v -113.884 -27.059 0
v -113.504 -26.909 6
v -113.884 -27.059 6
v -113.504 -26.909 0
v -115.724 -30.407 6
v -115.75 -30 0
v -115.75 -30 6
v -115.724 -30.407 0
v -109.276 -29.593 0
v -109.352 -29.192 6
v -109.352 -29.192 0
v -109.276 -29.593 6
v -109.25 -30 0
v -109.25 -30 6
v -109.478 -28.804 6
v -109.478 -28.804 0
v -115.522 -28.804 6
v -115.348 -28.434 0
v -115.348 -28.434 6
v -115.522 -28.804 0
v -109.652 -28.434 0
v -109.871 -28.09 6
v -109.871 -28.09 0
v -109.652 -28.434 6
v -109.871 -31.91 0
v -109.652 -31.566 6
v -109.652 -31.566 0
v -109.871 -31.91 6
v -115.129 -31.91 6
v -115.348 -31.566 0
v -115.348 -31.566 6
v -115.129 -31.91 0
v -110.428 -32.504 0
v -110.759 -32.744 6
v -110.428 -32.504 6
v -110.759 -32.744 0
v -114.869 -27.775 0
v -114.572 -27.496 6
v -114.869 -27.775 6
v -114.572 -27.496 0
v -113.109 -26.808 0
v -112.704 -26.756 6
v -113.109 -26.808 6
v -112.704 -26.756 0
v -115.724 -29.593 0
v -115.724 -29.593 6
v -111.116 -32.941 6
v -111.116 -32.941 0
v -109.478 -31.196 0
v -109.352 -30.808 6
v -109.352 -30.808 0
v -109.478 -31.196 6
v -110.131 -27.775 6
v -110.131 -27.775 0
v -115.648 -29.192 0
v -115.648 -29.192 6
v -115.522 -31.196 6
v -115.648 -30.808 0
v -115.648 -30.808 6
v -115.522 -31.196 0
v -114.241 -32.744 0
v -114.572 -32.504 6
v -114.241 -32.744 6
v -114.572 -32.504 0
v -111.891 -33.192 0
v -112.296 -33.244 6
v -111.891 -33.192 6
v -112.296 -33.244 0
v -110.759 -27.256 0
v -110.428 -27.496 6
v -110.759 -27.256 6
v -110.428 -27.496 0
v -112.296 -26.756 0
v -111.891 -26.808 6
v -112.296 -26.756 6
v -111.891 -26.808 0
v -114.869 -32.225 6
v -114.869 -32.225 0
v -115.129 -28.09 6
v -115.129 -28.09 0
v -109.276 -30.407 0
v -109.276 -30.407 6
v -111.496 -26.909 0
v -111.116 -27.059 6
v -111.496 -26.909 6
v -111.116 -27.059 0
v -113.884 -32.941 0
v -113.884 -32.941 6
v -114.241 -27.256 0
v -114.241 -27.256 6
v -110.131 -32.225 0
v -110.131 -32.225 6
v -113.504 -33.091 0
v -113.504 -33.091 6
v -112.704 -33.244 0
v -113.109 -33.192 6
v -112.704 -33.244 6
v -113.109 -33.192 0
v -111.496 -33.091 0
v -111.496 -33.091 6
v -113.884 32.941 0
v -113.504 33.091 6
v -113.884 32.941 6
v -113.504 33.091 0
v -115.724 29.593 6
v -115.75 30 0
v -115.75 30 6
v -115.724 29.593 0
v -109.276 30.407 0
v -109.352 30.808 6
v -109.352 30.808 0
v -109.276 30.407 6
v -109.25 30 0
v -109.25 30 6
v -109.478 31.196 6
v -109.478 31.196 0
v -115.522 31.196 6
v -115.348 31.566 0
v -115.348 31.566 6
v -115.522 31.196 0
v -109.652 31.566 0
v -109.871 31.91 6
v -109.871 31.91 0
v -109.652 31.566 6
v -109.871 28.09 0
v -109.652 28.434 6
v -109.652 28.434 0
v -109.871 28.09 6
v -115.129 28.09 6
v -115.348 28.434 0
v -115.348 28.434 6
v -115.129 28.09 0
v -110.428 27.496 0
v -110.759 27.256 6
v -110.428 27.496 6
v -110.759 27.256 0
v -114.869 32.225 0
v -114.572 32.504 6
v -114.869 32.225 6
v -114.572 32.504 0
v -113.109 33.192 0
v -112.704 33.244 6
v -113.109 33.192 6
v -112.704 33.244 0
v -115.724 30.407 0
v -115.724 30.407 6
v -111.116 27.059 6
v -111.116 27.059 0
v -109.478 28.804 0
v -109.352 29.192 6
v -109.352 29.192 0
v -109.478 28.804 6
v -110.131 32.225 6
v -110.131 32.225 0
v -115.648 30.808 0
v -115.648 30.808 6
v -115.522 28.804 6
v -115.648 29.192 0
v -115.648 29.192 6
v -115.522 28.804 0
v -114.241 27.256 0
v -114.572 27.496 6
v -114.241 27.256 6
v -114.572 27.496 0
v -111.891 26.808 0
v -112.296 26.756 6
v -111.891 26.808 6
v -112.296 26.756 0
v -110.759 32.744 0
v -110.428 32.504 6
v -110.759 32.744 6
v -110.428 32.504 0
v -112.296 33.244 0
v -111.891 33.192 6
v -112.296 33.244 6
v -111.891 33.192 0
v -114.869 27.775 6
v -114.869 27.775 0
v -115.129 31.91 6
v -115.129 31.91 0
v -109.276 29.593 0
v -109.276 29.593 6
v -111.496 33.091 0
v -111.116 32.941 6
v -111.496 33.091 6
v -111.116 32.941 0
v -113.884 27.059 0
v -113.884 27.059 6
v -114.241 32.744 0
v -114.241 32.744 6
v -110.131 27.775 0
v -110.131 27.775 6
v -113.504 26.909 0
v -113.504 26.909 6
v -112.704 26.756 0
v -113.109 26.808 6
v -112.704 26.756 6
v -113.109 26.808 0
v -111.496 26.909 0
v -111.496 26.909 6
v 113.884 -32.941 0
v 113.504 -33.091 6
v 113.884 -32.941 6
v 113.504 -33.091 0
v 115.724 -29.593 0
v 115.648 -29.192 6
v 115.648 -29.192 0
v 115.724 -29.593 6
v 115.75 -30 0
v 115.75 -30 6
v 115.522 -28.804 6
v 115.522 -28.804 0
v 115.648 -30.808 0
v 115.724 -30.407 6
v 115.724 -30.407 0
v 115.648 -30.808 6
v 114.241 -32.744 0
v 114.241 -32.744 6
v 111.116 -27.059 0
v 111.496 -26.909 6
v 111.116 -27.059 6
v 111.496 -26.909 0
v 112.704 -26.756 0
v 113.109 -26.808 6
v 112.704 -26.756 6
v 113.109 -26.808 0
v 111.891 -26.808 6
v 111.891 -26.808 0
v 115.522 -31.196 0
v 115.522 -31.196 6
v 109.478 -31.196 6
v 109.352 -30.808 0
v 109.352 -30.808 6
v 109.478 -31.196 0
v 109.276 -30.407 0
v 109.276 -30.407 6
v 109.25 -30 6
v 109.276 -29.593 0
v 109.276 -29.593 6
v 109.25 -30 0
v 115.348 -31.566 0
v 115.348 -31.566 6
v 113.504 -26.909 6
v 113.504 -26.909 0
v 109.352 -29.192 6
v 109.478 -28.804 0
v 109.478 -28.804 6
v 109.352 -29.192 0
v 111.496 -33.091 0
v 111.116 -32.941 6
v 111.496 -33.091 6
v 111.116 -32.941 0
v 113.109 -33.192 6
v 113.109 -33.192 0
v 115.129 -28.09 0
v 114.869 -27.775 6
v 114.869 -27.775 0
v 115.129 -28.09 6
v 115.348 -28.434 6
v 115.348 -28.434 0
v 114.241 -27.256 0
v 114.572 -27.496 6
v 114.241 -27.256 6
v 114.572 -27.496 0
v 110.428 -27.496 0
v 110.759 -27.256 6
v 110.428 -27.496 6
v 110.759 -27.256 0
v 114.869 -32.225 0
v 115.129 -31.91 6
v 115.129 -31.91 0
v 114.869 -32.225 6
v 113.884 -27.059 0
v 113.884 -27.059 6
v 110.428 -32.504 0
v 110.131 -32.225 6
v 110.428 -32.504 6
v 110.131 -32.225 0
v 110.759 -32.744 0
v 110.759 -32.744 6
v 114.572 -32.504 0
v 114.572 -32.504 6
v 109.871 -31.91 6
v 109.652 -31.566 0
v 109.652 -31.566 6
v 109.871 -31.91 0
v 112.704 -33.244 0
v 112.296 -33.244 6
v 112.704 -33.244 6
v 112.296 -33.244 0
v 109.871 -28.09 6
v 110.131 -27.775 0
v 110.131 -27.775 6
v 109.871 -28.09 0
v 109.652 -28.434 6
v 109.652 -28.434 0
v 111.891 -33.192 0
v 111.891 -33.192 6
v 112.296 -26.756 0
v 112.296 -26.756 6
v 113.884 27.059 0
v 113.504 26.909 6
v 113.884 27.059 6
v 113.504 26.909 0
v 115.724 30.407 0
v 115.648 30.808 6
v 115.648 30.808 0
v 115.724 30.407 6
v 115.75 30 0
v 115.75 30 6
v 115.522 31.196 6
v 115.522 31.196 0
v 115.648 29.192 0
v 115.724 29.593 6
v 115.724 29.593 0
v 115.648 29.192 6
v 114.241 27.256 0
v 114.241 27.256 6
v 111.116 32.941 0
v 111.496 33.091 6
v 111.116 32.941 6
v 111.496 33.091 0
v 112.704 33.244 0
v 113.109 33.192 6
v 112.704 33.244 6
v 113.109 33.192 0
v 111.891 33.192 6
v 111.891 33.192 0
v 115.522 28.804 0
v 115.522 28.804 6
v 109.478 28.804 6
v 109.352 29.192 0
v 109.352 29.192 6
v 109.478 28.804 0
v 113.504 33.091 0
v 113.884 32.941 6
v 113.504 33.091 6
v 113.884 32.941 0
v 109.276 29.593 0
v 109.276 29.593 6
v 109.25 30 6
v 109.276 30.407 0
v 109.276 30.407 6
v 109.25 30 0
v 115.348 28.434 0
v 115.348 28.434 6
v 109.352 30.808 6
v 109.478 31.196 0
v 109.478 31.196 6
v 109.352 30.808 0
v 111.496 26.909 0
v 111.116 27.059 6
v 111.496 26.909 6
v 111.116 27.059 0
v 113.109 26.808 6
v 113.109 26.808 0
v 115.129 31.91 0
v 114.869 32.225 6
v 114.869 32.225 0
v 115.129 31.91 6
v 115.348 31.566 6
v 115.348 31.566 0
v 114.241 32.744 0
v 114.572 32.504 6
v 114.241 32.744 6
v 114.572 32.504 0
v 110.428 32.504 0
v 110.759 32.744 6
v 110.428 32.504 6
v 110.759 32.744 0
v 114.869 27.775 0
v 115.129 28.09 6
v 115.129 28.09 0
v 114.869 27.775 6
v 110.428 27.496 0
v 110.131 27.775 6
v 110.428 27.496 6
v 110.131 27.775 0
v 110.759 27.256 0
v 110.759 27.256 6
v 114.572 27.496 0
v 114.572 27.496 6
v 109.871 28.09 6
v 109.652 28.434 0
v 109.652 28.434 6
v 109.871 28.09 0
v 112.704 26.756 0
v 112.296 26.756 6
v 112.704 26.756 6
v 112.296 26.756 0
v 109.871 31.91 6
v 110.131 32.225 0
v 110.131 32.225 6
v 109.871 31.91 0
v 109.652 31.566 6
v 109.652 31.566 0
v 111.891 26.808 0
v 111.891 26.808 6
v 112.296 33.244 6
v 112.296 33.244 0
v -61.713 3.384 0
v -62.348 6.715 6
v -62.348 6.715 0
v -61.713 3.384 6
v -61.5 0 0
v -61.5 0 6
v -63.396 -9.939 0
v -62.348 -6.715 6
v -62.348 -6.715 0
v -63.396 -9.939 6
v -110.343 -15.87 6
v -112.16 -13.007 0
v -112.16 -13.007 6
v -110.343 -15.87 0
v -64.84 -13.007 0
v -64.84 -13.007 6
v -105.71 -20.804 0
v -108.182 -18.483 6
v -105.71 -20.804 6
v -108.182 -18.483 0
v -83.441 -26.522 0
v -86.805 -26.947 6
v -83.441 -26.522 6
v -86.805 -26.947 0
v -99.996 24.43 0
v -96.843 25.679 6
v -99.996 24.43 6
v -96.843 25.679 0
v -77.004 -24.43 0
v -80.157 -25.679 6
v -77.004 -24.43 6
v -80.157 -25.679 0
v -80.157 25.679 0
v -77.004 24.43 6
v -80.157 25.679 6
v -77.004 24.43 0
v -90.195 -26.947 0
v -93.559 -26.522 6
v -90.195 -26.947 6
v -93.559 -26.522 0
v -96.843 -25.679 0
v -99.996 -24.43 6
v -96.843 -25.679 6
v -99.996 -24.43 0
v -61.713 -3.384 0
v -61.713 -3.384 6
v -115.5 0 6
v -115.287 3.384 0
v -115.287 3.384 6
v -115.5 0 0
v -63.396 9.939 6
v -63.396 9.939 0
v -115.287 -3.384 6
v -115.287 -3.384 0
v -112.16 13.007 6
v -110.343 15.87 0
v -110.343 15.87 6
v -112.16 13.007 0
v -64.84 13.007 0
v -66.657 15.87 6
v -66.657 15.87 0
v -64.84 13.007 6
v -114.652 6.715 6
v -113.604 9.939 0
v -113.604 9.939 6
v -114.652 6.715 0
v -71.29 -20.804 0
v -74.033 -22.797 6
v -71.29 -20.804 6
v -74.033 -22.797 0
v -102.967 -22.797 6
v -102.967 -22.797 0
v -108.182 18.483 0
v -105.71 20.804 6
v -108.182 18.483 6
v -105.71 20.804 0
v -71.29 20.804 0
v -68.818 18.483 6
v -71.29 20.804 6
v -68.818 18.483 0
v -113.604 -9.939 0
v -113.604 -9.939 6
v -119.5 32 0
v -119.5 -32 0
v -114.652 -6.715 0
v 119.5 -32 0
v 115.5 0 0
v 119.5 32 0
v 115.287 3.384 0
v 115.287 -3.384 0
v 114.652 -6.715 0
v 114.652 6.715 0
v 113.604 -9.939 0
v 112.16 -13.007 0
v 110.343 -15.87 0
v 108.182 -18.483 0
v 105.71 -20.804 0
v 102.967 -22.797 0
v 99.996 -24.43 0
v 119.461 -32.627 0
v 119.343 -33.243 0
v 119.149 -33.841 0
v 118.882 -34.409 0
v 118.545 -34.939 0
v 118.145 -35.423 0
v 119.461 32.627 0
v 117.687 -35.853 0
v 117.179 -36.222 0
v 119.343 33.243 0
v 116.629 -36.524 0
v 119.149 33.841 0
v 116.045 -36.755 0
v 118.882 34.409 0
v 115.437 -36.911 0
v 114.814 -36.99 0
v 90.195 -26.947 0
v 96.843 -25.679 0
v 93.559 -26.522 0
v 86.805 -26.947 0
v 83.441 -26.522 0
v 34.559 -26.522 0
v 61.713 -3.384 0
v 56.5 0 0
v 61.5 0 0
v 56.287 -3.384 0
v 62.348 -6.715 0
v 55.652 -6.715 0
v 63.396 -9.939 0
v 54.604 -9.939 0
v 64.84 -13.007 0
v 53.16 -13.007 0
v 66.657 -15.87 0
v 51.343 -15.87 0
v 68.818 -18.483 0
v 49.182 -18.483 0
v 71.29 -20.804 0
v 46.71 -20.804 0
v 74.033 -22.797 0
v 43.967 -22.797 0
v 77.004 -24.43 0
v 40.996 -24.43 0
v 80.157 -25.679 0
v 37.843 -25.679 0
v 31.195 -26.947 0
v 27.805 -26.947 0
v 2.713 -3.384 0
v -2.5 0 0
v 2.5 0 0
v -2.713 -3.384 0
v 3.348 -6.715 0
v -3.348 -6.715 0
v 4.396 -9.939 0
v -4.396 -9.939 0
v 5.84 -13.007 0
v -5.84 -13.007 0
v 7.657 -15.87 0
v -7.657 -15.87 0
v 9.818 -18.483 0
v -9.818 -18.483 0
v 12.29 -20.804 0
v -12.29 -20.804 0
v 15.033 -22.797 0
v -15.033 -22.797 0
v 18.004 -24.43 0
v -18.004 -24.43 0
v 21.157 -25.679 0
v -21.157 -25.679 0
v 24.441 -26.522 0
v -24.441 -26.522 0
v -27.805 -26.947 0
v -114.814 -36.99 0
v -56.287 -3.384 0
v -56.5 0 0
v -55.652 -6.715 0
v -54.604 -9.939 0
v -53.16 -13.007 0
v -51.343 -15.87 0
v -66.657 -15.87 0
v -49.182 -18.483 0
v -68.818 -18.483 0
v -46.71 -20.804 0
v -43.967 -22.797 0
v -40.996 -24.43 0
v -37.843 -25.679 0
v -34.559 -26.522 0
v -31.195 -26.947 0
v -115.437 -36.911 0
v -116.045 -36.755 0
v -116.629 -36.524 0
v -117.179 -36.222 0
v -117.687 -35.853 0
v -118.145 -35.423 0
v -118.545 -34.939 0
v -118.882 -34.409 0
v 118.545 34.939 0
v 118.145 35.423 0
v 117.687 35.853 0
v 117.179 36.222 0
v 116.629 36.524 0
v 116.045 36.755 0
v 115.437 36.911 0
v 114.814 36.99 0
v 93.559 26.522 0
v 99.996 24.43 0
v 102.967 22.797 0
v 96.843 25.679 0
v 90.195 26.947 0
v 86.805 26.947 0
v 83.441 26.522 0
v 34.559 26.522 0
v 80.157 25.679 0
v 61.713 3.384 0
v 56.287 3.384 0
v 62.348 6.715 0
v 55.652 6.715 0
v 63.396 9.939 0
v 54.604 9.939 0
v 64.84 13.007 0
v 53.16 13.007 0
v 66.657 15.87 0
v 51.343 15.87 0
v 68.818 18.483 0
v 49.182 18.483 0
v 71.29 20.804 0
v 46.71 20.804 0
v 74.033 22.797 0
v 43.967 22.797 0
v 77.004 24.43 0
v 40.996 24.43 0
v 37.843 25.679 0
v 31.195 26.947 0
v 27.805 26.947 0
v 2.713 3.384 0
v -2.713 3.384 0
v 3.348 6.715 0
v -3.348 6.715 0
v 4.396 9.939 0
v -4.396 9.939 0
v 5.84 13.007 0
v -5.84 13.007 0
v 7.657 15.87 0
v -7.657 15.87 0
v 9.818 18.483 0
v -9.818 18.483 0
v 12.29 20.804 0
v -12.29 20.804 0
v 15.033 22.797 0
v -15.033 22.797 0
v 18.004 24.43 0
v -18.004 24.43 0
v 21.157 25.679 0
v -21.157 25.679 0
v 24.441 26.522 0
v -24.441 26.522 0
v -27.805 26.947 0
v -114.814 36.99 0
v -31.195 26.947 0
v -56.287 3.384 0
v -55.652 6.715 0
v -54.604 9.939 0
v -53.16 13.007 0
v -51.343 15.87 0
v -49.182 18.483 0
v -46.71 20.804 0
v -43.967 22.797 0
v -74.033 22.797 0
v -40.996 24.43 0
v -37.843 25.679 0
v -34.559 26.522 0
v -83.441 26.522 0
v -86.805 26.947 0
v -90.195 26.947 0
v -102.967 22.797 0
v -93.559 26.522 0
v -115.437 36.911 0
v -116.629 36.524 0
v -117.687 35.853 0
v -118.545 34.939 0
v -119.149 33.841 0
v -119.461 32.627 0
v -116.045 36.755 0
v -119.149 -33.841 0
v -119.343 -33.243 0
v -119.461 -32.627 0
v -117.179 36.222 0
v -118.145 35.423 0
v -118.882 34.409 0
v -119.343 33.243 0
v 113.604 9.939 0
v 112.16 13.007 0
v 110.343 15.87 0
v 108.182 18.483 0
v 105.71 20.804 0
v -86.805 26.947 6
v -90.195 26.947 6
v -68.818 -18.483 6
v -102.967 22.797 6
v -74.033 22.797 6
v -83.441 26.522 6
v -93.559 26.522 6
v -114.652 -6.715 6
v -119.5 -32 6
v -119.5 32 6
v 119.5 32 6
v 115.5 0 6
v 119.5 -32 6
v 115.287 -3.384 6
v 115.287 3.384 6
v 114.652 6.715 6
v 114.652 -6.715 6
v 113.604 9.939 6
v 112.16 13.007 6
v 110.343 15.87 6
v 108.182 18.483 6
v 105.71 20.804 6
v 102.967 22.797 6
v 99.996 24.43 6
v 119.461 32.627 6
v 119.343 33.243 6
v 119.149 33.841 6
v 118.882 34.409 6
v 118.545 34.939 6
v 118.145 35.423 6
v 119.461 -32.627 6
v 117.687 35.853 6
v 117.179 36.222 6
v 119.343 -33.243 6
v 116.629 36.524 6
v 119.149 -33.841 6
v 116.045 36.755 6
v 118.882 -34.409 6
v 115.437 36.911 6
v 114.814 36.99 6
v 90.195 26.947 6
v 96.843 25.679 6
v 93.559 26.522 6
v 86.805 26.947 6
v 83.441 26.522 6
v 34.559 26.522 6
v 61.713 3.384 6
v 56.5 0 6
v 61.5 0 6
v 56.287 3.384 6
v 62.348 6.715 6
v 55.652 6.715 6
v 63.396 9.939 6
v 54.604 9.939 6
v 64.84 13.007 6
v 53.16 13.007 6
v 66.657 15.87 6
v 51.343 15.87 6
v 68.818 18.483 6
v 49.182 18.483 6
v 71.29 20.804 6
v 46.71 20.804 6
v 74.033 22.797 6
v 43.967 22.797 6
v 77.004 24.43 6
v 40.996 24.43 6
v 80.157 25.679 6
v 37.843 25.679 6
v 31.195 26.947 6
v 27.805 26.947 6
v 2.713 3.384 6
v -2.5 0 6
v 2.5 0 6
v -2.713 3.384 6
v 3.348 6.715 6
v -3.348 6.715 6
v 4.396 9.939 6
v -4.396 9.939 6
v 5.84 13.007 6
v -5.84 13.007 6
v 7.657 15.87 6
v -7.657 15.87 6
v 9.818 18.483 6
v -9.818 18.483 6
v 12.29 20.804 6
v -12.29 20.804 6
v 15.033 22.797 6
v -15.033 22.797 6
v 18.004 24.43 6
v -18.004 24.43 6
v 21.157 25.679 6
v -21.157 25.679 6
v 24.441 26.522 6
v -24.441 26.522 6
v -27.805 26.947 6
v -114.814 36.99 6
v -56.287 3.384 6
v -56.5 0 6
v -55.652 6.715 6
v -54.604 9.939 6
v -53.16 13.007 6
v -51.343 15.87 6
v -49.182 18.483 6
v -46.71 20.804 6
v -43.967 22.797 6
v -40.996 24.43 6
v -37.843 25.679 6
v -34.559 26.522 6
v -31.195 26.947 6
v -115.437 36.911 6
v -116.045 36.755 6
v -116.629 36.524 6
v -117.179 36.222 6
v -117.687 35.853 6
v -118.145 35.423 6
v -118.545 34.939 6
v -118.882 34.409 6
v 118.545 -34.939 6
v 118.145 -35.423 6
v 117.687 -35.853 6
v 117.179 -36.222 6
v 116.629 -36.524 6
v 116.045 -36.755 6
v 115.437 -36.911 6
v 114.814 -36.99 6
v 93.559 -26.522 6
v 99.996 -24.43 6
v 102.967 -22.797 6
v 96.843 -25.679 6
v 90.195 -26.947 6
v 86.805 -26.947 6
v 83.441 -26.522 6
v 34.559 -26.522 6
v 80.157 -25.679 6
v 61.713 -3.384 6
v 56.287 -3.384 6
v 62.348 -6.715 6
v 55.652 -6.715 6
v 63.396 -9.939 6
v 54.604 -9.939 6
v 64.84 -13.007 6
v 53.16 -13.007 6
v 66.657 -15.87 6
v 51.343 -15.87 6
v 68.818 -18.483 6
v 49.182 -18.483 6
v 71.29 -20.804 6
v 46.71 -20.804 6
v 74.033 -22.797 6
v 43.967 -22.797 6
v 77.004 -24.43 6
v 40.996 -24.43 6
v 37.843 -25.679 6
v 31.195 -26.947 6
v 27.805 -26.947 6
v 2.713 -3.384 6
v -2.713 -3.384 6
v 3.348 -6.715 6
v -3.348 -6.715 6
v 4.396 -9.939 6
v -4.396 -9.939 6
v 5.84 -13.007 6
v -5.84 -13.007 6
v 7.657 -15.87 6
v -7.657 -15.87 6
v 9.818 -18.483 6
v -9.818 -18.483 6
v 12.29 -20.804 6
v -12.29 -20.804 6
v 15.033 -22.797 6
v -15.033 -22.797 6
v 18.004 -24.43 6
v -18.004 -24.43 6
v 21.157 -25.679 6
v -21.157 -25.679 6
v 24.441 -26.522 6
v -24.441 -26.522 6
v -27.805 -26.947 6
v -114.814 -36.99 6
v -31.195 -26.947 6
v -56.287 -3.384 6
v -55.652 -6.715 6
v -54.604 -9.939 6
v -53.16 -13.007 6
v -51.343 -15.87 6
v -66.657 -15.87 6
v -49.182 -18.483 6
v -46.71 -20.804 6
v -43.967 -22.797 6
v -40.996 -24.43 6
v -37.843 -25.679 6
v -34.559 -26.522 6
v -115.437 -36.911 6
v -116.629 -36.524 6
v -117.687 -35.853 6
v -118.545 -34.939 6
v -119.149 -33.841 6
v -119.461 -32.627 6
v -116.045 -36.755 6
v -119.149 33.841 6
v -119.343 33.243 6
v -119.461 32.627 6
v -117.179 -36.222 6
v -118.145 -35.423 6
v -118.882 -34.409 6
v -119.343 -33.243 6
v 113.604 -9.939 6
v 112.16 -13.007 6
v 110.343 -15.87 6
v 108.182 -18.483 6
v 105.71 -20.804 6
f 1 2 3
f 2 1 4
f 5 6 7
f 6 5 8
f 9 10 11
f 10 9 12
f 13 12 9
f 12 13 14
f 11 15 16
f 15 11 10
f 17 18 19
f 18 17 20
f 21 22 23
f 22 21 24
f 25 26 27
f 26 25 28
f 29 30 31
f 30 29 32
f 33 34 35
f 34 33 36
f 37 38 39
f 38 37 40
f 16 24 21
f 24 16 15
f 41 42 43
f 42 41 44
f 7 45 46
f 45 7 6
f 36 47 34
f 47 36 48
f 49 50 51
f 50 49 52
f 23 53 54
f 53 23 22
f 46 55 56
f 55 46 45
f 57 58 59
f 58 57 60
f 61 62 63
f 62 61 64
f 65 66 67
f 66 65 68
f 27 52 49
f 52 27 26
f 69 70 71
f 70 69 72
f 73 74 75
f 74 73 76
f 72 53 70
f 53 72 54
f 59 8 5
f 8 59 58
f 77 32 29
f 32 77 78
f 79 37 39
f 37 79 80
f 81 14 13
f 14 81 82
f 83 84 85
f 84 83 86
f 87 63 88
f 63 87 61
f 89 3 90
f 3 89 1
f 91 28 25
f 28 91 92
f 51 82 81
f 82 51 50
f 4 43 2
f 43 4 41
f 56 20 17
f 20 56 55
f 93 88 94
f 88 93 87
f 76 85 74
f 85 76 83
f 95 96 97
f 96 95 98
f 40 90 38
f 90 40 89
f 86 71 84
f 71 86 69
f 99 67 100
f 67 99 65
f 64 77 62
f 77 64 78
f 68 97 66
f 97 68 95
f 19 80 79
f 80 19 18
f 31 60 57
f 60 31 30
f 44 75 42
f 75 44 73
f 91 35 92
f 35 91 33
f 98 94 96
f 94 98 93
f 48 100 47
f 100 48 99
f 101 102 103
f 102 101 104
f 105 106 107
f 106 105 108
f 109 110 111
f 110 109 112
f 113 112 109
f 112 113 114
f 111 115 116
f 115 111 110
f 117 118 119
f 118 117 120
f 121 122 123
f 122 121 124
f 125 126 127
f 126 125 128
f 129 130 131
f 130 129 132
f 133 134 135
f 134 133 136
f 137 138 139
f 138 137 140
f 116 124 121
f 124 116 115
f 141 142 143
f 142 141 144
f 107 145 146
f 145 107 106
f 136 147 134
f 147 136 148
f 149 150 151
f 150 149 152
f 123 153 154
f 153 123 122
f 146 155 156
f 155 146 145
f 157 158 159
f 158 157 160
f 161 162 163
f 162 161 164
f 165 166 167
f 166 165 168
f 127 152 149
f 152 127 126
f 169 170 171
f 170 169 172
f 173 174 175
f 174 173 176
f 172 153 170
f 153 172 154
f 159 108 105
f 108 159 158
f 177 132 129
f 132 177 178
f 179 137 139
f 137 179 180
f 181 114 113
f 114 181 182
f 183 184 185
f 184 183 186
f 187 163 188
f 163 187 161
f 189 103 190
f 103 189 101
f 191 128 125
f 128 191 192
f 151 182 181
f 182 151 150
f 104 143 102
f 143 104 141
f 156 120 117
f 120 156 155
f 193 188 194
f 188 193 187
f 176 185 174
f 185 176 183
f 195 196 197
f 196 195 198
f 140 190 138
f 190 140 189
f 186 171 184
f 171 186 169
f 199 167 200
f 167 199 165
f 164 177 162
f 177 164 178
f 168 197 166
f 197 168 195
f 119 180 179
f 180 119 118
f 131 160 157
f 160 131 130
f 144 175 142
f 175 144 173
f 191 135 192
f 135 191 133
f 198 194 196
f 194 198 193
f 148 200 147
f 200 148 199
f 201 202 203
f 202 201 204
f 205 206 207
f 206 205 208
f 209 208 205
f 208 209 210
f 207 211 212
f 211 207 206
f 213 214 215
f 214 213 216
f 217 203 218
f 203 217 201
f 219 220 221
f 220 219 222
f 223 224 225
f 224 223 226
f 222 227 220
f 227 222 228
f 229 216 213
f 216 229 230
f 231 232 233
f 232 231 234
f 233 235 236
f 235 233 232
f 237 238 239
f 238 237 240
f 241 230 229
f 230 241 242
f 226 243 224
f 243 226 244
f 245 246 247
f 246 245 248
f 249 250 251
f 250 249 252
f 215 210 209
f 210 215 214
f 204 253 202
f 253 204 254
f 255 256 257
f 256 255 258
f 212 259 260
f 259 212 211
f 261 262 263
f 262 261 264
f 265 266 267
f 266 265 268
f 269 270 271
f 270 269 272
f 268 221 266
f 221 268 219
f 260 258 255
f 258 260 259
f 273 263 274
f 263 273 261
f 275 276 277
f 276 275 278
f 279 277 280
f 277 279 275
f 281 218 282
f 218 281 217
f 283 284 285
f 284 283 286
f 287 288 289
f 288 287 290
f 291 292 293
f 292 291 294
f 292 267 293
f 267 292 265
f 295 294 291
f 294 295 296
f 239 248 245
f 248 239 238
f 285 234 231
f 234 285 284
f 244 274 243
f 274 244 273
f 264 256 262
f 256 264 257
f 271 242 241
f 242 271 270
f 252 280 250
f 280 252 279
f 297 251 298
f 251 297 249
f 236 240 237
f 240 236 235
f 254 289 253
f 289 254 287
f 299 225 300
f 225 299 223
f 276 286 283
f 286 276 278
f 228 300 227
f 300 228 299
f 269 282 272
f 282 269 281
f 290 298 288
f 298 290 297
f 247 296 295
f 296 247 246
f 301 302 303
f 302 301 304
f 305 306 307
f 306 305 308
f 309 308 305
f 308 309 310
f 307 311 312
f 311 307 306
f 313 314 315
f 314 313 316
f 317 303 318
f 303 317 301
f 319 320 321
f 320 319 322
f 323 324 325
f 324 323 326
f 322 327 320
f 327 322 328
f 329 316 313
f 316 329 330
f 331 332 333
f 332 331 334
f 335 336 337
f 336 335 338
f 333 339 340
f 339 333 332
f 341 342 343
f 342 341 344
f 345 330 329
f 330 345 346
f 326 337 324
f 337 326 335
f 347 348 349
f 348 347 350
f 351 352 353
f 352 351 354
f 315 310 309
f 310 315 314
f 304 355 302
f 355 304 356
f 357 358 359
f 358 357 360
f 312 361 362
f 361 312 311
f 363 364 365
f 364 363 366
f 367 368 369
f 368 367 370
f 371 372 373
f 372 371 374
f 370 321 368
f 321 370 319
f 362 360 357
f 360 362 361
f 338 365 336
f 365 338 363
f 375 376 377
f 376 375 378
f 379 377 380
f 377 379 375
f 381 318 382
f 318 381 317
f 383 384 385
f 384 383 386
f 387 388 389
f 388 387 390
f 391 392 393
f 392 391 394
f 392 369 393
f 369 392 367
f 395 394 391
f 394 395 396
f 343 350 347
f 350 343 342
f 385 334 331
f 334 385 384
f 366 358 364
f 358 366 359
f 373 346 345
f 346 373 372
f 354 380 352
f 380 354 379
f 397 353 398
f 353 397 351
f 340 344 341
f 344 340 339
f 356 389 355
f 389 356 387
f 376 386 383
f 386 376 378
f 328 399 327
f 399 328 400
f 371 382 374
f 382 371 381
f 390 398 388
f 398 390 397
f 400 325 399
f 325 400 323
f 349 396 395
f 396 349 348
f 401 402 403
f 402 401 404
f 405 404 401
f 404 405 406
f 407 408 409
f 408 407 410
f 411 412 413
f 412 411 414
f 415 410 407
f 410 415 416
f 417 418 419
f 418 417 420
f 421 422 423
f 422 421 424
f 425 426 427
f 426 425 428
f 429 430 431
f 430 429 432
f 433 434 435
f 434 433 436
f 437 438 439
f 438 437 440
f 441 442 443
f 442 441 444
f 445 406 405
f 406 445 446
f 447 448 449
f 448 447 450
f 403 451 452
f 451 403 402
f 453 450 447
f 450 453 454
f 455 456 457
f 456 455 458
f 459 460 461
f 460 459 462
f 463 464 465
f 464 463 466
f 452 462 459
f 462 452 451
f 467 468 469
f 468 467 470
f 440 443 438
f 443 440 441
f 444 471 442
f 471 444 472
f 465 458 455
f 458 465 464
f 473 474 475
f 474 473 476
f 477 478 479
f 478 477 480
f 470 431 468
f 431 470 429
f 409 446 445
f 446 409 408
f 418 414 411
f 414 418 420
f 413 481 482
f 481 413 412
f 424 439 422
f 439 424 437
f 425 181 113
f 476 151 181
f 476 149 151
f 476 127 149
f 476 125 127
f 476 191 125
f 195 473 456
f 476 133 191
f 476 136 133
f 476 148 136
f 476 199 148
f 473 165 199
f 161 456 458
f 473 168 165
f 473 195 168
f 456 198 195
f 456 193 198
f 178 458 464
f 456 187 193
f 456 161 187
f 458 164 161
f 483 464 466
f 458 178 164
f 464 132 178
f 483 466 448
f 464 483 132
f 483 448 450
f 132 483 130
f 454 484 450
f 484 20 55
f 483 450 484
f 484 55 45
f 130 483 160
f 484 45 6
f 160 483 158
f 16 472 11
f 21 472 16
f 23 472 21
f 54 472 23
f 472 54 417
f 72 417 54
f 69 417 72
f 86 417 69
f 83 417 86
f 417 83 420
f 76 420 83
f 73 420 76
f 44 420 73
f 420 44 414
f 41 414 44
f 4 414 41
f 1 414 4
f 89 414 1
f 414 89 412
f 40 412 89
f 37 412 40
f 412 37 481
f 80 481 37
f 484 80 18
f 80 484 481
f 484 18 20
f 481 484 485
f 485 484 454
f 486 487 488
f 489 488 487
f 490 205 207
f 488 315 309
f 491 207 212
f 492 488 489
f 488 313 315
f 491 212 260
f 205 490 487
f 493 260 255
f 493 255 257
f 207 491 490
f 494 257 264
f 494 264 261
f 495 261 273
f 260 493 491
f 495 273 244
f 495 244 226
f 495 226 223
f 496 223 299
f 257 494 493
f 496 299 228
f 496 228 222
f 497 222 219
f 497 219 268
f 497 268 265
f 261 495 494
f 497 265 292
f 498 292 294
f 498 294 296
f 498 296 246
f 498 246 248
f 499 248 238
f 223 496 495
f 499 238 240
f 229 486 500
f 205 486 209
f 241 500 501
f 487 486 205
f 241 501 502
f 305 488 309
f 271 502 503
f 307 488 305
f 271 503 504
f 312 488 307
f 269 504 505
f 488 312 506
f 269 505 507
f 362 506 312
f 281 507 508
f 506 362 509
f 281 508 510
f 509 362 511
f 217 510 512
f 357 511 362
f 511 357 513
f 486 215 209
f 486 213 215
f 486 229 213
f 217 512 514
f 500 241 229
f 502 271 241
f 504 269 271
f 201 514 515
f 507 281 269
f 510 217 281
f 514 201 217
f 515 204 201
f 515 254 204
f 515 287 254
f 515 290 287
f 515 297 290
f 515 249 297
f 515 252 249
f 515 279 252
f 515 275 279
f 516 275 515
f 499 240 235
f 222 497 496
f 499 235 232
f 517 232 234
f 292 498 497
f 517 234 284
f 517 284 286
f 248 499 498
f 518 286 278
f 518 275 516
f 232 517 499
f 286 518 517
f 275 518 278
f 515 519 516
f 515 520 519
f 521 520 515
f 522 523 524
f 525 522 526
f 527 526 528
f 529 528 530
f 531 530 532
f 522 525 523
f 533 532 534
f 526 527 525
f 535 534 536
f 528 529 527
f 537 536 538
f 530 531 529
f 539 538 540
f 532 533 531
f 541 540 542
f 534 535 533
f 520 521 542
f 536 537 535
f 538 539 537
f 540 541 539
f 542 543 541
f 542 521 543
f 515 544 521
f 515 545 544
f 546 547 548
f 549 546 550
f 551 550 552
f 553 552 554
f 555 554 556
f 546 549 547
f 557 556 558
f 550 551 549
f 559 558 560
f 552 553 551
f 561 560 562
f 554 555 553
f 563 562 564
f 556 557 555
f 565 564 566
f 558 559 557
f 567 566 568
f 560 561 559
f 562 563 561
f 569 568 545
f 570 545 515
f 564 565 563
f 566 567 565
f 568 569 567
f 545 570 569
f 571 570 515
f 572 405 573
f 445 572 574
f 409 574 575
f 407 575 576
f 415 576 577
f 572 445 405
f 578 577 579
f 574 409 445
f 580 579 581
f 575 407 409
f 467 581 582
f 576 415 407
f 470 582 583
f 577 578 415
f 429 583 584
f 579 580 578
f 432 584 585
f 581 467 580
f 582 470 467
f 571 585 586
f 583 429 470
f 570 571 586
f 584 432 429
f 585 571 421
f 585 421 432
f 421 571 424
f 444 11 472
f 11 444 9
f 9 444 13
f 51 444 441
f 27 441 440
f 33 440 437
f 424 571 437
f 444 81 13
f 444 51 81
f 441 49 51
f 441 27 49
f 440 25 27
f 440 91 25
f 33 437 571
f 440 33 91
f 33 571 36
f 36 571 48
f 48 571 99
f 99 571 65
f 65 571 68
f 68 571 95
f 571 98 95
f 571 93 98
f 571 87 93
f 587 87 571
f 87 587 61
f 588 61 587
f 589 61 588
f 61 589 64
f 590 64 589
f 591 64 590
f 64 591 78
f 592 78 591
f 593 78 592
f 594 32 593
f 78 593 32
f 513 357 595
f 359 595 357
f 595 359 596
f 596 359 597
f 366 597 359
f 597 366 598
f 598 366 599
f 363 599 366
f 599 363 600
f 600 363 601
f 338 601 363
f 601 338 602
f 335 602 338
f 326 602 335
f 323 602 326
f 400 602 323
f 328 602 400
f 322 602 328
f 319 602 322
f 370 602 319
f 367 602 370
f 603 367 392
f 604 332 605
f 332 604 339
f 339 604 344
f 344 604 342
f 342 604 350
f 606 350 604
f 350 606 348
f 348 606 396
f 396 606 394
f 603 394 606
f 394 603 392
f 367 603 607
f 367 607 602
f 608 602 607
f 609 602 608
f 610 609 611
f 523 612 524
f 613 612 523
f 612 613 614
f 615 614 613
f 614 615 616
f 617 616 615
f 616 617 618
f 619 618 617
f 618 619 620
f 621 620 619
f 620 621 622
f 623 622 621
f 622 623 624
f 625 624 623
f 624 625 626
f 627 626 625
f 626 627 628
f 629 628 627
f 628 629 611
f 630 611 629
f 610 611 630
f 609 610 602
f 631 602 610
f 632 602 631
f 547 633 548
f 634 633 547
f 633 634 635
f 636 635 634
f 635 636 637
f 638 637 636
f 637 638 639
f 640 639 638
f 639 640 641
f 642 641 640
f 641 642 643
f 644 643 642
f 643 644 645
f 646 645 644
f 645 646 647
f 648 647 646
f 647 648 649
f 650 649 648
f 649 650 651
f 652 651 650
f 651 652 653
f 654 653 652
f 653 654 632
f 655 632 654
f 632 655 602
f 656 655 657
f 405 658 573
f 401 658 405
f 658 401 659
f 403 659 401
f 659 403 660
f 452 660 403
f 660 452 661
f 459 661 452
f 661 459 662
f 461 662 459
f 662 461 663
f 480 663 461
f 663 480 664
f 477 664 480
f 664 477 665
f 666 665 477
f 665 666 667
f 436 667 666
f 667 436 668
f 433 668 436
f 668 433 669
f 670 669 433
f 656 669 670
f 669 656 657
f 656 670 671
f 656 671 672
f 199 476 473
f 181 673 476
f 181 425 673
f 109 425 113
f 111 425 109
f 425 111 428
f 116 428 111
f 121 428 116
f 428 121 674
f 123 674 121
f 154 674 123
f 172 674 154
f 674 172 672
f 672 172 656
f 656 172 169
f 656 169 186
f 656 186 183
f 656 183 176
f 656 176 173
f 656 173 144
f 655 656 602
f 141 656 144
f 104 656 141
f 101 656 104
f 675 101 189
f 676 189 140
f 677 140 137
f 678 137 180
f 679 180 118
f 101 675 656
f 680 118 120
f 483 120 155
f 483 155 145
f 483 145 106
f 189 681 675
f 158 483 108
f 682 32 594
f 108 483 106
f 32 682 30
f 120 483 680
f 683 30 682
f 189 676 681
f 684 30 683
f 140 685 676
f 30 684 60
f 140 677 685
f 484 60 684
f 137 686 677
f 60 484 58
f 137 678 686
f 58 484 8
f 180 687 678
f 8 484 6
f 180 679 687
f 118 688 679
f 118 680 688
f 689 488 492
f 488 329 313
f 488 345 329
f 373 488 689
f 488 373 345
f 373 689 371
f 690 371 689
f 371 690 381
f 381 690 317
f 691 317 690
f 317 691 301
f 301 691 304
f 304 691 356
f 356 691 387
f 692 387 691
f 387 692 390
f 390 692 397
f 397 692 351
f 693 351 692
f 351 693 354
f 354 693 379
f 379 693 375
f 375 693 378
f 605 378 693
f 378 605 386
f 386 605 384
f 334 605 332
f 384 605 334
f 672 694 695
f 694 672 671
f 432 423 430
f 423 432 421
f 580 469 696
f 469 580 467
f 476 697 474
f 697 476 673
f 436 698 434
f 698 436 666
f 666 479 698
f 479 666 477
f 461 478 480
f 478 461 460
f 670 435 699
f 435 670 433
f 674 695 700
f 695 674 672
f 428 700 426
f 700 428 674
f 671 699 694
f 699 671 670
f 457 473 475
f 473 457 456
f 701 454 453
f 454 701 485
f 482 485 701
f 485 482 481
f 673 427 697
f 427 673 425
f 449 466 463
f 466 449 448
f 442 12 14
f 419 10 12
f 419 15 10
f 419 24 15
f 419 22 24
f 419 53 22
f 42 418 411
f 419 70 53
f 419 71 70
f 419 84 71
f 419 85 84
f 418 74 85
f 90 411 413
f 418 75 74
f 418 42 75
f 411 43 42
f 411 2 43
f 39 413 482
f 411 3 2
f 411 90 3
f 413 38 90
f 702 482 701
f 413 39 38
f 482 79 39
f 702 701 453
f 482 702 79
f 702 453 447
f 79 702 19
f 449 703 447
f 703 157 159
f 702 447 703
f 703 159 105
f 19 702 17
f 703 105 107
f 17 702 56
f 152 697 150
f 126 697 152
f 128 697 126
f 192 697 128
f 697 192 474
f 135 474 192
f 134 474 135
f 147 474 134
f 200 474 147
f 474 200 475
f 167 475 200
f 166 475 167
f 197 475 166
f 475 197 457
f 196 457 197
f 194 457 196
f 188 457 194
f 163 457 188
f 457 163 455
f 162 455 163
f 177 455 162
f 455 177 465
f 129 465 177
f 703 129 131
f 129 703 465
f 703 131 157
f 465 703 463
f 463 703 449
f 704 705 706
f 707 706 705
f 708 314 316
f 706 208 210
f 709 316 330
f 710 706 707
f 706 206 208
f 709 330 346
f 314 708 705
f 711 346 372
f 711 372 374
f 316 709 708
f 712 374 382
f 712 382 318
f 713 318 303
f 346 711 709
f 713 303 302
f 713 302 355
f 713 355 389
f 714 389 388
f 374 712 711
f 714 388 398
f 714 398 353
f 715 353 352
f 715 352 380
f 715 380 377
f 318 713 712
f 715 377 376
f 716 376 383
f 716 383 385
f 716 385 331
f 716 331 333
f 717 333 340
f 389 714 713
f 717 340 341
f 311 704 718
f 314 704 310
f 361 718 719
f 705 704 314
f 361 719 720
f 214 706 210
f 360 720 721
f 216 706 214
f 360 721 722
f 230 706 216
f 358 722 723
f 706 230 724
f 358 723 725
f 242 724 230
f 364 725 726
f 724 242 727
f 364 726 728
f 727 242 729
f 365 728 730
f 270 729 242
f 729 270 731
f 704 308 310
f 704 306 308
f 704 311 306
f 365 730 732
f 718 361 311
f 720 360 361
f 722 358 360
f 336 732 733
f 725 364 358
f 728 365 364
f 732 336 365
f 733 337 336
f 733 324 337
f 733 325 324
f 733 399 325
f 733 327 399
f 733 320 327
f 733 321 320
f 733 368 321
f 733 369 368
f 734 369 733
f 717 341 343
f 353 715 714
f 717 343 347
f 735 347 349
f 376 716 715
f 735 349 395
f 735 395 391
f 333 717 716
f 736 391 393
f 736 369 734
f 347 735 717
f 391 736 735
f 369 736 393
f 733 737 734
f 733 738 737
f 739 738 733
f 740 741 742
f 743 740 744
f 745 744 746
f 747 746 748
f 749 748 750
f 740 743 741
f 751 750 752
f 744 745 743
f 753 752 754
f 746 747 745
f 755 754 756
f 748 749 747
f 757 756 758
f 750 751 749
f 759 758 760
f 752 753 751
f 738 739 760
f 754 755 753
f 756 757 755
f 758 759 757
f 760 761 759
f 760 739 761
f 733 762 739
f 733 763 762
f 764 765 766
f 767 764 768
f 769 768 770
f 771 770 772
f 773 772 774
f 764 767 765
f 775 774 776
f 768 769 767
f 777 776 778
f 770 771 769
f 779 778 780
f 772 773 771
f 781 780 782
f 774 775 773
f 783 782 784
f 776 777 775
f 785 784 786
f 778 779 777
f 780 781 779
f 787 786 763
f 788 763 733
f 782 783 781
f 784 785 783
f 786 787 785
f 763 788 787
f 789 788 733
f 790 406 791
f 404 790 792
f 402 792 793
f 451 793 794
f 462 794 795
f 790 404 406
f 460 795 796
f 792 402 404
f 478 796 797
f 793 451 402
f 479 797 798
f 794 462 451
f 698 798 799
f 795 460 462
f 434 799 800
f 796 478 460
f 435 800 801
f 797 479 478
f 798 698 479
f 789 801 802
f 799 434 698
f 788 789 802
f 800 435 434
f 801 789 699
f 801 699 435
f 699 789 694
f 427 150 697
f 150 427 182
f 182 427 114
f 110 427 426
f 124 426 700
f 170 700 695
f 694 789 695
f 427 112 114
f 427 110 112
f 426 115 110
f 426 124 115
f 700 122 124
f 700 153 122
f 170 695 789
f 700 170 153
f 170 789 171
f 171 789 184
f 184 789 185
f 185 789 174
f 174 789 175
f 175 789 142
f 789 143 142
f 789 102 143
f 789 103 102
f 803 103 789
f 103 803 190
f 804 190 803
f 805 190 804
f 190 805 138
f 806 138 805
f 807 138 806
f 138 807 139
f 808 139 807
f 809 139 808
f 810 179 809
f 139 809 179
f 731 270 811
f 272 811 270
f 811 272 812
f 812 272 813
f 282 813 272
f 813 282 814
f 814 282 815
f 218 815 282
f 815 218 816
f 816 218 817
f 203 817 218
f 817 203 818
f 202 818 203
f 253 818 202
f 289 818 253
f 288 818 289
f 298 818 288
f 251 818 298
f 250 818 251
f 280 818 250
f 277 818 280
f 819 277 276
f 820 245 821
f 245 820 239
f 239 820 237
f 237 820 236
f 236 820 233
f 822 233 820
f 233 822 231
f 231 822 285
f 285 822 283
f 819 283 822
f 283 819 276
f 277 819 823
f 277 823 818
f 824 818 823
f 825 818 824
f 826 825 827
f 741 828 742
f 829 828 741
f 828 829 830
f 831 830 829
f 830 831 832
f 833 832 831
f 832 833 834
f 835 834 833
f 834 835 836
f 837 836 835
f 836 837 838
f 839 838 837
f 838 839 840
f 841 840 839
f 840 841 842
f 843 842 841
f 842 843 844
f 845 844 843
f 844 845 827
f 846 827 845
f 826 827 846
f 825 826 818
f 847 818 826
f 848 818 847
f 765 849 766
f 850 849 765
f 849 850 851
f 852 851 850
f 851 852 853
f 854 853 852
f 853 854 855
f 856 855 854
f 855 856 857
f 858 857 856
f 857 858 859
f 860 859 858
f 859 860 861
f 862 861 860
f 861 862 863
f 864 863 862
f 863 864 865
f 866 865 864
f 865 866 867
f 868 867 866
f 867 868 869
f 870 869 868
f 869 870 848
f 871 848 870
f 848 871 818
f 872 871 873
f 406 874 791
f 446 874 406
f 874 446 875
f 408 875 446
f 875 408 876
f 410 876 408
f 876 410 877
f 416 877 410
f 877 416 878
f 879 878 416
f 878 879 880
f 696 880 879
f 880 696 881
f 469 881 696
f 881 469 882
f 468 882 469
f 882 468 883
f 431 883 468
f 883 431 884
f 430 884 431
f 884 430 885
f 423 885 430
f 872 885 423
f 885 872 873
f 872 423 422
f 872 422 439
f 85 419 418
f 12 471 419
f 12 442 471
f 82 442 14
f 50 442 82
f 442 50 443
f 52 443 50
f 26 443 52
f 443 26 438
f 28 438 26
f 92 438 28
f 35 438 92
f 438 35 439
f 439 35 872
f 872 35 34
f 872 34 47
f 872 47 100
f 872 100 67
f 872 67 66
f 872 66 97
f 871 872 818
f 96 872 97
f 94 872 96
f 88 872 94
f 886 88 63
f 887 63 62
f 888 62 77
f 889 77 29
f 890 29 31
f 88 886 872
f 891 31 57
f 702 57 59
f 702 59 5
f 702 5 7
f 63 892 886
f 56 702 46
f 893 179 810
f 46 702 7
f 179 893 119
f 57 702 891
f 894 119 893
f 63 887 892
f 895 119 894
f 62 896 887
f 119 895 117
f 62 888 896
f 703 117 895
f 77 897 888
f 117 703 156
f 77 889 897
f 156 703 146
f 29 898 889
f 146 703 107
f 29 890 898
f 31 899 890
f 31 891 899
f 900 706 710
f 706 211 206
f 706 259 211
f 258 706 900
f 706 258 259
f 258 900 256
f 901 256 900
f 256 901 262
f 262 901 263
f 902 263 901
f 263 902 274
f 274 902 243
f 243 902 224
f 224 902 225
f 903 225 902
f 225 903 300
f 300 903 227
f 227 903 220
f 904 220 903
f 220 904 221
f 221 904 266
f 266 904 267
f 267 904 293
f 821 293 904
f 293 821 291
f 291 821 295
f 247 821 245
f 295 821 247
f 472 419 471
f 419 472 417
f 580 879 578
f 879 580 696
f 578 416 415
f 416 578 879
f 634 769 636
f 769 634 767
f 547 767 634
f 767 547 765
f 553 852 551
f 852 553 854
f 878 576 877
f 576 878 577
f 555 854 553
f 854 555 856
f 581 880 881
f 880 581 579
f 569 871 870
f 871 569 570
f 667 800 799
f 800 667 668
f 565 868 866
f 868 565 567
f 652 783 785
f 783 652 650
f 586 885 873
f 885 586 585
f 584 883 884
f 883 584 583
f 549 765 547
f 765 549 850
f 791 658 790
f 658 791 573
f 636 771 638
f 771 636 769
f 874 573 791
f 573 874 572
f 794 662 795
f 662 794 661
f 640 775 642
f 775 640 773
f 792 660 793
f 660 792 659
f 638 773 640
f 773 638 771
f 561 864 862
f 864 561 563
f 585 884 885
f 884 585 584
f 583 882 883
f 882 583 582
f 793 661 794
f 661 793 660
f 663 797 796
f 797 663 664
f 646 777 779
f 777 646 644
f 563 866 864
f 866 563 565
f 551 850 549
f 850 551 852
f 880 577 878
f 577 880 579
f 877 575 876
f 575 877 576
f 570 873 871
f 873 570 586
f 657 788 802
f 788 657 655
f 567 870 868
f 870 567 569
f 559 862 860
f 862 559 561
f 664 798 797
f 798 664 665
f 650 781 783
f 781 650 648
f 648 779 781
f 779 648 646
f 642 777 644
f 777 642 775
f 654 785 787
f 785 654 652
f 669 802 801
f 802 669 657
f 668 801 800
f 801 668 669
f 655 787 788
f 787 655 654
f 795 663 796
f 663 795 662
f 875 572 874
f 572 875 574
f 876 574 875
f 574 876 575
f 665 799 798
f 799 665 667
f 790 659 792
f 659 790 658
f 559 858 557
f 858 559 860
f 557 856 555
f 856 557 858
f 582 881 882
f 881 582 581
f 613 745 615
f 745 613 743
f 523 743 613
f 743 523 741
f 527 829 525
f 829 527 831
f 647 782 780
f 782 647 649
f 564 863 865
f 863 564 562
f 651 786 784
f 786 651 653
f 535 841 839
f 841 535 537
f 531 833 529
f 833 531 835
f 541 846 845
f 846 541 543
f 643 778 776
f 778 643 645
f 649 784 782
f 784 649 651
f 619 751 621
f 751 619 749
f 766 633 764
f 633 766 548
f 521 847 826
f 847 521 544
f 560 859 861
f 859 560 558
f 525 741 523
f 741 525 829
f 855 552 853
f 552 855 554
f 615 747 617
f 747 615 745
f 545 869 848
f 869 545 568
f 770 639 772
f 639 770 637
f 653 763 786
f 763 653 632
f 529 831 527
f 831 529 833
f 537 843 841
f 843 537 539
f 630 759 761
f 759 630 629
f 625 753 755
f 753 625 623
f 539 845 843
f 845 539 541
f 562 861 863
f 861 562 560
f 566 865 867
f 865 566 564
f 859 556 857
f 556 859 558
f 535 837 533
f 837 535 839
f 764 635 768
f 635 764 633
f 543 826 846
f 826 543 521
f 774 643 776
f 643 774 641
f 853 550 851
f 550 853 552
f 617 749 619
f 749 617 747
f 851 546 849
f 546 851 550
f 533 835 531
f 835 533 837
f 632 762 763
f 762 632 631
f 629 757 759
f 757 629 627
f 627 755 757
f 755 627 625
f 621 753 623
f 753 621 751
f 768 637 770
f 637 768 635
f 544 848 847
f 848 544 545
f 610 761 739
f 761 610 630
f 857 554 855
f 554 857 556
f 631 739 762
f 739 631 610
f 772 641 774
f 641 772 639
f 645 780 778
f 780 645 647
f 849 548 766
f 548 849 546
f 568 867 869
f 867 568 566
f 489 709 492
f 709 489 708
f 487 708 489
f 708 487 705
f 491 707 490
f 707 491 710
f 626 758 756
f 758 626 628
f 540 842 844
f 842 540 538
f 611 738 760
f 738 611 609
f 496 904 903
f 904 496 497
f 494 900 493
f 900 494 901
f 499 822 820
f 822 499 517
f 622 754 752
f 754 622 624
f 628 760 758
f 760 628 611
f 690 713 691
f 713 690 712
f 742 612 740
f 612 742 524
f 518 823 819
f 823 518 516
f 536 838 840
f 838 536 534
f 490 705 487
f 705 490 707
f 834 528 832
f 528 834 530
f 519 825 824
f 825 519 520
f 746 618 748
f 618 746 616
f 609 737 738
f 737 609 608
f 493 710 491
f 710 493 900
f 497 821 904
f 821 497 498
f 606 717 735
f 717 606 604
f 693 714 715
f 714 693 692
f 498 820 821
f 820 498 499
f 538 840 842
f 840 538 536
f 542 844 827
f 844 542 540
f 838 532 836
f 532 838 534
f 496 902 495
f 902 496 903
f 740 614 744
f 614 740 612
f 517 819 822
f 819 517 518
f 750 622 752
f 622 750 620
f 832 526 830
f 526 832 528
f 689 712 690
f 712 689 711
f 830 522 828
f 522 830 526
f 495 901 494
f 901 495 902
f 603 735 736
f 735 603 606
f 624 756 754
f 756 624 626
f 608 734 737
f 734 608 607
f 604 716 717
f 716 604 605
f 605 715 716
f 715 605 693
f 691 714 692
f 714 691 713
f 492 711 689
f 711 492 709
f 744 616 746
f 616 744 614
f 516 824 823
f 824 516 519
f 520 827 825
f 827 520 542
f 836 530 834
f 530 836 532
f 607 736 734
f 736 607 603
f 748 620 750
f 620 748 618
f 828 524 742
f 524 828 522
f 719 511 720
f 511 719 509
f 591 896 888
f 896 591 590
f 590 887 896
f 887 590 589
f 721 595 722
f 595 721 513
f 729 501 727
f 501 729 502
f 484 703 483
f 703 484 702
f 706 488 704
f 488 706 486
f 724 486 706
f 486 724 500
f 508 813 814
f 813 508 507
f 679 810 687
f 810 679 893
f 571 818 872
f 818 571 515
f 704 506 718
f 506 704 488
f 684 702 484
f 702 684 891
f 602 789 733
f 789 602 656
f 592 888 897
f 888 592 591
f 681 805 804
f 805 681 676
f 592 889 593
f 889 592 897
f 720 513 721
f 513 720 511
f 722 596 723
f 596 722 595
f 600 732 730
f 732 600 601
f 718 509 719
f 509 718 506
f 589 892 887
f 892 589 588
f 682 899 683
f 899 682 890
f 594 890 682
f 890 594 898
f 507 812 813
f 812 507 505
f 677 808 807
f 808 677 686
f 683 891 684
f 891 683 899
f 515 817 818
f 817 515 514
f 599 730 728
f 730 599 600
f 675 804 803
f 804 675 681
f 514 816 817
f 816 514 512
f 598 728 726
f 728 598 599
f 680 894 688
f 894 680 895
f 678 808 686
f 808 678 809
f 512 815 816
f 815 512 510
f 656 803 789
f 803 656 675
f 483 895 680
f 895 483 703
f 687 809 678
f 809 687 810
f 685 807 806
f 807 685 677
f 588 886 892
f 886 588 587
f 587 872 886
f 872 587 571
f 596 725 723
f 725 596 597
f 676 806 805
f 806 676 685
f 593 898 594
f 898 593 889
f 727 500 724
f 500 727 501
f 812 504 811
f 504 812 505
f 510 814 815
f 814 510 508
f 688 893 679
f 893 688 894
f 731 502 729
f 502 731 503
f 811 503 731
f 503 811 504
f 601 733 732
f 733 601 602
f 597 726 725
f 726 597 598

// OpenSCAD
$fn = 50;


difference() {
	union() {
		hull() {
			translate(v = [-114.5000000000, 32.0000000000, 0]) {
				cylinder(h = 6, r = 5);
			}
			translate(v = [114.5000000000, 32.0000000000, 0]) {
				cylinder(h = 6, r = 5);
			}
			translate(v = [-114.5000000000, -32.0000000000, 0]) {
				cylinder(h = 6, r = 5);
			}
			translate(v = [114.5000000000, -32.0000000000, 0]) {
				cylinder(h = 6, r = 5);
			}
		}
	}
	union() {
		#translate(v = [-112.5000000000, -30.0000000000, -100.0000000000]) {
			cylinder(h = 200, r = 3.2500000000);
		}
		#translate(v = [-112.5000000000, 30.0000000000, -100.0000000000]) {
			cylinder(h = 200, r = 3.2500000000);
		}
		#translate(v = [112.5000000000, -30.0000000000, -100.0000000000]) {
			cylinder(h = 200, r = 3.2500000000);
		}
		#translate(v = [112.5000000000, 30.0000000000, -100.0000000000]) {
			cylinder(h = 200, r = 3.2500000000);
		}
		#translate(v = [-88.5000000000, 0, 0]) {
			cylinder(h = 6, r = 27.0000000000);
		}
		#translate(v = [-29.5000000000, 0, 0]) {
			cylinder(h = 6, r = 27.0000000000);
		}
		#translate(v = [29.5000000000, 0, 0]) {
			cylinder(h = 6, r = 27.0000000000);
		}
		#translate(v = [88.5000000000, 0, 0]) {
			cylinder(h = 6, r = 27.0000000000);
		}
	}
}
